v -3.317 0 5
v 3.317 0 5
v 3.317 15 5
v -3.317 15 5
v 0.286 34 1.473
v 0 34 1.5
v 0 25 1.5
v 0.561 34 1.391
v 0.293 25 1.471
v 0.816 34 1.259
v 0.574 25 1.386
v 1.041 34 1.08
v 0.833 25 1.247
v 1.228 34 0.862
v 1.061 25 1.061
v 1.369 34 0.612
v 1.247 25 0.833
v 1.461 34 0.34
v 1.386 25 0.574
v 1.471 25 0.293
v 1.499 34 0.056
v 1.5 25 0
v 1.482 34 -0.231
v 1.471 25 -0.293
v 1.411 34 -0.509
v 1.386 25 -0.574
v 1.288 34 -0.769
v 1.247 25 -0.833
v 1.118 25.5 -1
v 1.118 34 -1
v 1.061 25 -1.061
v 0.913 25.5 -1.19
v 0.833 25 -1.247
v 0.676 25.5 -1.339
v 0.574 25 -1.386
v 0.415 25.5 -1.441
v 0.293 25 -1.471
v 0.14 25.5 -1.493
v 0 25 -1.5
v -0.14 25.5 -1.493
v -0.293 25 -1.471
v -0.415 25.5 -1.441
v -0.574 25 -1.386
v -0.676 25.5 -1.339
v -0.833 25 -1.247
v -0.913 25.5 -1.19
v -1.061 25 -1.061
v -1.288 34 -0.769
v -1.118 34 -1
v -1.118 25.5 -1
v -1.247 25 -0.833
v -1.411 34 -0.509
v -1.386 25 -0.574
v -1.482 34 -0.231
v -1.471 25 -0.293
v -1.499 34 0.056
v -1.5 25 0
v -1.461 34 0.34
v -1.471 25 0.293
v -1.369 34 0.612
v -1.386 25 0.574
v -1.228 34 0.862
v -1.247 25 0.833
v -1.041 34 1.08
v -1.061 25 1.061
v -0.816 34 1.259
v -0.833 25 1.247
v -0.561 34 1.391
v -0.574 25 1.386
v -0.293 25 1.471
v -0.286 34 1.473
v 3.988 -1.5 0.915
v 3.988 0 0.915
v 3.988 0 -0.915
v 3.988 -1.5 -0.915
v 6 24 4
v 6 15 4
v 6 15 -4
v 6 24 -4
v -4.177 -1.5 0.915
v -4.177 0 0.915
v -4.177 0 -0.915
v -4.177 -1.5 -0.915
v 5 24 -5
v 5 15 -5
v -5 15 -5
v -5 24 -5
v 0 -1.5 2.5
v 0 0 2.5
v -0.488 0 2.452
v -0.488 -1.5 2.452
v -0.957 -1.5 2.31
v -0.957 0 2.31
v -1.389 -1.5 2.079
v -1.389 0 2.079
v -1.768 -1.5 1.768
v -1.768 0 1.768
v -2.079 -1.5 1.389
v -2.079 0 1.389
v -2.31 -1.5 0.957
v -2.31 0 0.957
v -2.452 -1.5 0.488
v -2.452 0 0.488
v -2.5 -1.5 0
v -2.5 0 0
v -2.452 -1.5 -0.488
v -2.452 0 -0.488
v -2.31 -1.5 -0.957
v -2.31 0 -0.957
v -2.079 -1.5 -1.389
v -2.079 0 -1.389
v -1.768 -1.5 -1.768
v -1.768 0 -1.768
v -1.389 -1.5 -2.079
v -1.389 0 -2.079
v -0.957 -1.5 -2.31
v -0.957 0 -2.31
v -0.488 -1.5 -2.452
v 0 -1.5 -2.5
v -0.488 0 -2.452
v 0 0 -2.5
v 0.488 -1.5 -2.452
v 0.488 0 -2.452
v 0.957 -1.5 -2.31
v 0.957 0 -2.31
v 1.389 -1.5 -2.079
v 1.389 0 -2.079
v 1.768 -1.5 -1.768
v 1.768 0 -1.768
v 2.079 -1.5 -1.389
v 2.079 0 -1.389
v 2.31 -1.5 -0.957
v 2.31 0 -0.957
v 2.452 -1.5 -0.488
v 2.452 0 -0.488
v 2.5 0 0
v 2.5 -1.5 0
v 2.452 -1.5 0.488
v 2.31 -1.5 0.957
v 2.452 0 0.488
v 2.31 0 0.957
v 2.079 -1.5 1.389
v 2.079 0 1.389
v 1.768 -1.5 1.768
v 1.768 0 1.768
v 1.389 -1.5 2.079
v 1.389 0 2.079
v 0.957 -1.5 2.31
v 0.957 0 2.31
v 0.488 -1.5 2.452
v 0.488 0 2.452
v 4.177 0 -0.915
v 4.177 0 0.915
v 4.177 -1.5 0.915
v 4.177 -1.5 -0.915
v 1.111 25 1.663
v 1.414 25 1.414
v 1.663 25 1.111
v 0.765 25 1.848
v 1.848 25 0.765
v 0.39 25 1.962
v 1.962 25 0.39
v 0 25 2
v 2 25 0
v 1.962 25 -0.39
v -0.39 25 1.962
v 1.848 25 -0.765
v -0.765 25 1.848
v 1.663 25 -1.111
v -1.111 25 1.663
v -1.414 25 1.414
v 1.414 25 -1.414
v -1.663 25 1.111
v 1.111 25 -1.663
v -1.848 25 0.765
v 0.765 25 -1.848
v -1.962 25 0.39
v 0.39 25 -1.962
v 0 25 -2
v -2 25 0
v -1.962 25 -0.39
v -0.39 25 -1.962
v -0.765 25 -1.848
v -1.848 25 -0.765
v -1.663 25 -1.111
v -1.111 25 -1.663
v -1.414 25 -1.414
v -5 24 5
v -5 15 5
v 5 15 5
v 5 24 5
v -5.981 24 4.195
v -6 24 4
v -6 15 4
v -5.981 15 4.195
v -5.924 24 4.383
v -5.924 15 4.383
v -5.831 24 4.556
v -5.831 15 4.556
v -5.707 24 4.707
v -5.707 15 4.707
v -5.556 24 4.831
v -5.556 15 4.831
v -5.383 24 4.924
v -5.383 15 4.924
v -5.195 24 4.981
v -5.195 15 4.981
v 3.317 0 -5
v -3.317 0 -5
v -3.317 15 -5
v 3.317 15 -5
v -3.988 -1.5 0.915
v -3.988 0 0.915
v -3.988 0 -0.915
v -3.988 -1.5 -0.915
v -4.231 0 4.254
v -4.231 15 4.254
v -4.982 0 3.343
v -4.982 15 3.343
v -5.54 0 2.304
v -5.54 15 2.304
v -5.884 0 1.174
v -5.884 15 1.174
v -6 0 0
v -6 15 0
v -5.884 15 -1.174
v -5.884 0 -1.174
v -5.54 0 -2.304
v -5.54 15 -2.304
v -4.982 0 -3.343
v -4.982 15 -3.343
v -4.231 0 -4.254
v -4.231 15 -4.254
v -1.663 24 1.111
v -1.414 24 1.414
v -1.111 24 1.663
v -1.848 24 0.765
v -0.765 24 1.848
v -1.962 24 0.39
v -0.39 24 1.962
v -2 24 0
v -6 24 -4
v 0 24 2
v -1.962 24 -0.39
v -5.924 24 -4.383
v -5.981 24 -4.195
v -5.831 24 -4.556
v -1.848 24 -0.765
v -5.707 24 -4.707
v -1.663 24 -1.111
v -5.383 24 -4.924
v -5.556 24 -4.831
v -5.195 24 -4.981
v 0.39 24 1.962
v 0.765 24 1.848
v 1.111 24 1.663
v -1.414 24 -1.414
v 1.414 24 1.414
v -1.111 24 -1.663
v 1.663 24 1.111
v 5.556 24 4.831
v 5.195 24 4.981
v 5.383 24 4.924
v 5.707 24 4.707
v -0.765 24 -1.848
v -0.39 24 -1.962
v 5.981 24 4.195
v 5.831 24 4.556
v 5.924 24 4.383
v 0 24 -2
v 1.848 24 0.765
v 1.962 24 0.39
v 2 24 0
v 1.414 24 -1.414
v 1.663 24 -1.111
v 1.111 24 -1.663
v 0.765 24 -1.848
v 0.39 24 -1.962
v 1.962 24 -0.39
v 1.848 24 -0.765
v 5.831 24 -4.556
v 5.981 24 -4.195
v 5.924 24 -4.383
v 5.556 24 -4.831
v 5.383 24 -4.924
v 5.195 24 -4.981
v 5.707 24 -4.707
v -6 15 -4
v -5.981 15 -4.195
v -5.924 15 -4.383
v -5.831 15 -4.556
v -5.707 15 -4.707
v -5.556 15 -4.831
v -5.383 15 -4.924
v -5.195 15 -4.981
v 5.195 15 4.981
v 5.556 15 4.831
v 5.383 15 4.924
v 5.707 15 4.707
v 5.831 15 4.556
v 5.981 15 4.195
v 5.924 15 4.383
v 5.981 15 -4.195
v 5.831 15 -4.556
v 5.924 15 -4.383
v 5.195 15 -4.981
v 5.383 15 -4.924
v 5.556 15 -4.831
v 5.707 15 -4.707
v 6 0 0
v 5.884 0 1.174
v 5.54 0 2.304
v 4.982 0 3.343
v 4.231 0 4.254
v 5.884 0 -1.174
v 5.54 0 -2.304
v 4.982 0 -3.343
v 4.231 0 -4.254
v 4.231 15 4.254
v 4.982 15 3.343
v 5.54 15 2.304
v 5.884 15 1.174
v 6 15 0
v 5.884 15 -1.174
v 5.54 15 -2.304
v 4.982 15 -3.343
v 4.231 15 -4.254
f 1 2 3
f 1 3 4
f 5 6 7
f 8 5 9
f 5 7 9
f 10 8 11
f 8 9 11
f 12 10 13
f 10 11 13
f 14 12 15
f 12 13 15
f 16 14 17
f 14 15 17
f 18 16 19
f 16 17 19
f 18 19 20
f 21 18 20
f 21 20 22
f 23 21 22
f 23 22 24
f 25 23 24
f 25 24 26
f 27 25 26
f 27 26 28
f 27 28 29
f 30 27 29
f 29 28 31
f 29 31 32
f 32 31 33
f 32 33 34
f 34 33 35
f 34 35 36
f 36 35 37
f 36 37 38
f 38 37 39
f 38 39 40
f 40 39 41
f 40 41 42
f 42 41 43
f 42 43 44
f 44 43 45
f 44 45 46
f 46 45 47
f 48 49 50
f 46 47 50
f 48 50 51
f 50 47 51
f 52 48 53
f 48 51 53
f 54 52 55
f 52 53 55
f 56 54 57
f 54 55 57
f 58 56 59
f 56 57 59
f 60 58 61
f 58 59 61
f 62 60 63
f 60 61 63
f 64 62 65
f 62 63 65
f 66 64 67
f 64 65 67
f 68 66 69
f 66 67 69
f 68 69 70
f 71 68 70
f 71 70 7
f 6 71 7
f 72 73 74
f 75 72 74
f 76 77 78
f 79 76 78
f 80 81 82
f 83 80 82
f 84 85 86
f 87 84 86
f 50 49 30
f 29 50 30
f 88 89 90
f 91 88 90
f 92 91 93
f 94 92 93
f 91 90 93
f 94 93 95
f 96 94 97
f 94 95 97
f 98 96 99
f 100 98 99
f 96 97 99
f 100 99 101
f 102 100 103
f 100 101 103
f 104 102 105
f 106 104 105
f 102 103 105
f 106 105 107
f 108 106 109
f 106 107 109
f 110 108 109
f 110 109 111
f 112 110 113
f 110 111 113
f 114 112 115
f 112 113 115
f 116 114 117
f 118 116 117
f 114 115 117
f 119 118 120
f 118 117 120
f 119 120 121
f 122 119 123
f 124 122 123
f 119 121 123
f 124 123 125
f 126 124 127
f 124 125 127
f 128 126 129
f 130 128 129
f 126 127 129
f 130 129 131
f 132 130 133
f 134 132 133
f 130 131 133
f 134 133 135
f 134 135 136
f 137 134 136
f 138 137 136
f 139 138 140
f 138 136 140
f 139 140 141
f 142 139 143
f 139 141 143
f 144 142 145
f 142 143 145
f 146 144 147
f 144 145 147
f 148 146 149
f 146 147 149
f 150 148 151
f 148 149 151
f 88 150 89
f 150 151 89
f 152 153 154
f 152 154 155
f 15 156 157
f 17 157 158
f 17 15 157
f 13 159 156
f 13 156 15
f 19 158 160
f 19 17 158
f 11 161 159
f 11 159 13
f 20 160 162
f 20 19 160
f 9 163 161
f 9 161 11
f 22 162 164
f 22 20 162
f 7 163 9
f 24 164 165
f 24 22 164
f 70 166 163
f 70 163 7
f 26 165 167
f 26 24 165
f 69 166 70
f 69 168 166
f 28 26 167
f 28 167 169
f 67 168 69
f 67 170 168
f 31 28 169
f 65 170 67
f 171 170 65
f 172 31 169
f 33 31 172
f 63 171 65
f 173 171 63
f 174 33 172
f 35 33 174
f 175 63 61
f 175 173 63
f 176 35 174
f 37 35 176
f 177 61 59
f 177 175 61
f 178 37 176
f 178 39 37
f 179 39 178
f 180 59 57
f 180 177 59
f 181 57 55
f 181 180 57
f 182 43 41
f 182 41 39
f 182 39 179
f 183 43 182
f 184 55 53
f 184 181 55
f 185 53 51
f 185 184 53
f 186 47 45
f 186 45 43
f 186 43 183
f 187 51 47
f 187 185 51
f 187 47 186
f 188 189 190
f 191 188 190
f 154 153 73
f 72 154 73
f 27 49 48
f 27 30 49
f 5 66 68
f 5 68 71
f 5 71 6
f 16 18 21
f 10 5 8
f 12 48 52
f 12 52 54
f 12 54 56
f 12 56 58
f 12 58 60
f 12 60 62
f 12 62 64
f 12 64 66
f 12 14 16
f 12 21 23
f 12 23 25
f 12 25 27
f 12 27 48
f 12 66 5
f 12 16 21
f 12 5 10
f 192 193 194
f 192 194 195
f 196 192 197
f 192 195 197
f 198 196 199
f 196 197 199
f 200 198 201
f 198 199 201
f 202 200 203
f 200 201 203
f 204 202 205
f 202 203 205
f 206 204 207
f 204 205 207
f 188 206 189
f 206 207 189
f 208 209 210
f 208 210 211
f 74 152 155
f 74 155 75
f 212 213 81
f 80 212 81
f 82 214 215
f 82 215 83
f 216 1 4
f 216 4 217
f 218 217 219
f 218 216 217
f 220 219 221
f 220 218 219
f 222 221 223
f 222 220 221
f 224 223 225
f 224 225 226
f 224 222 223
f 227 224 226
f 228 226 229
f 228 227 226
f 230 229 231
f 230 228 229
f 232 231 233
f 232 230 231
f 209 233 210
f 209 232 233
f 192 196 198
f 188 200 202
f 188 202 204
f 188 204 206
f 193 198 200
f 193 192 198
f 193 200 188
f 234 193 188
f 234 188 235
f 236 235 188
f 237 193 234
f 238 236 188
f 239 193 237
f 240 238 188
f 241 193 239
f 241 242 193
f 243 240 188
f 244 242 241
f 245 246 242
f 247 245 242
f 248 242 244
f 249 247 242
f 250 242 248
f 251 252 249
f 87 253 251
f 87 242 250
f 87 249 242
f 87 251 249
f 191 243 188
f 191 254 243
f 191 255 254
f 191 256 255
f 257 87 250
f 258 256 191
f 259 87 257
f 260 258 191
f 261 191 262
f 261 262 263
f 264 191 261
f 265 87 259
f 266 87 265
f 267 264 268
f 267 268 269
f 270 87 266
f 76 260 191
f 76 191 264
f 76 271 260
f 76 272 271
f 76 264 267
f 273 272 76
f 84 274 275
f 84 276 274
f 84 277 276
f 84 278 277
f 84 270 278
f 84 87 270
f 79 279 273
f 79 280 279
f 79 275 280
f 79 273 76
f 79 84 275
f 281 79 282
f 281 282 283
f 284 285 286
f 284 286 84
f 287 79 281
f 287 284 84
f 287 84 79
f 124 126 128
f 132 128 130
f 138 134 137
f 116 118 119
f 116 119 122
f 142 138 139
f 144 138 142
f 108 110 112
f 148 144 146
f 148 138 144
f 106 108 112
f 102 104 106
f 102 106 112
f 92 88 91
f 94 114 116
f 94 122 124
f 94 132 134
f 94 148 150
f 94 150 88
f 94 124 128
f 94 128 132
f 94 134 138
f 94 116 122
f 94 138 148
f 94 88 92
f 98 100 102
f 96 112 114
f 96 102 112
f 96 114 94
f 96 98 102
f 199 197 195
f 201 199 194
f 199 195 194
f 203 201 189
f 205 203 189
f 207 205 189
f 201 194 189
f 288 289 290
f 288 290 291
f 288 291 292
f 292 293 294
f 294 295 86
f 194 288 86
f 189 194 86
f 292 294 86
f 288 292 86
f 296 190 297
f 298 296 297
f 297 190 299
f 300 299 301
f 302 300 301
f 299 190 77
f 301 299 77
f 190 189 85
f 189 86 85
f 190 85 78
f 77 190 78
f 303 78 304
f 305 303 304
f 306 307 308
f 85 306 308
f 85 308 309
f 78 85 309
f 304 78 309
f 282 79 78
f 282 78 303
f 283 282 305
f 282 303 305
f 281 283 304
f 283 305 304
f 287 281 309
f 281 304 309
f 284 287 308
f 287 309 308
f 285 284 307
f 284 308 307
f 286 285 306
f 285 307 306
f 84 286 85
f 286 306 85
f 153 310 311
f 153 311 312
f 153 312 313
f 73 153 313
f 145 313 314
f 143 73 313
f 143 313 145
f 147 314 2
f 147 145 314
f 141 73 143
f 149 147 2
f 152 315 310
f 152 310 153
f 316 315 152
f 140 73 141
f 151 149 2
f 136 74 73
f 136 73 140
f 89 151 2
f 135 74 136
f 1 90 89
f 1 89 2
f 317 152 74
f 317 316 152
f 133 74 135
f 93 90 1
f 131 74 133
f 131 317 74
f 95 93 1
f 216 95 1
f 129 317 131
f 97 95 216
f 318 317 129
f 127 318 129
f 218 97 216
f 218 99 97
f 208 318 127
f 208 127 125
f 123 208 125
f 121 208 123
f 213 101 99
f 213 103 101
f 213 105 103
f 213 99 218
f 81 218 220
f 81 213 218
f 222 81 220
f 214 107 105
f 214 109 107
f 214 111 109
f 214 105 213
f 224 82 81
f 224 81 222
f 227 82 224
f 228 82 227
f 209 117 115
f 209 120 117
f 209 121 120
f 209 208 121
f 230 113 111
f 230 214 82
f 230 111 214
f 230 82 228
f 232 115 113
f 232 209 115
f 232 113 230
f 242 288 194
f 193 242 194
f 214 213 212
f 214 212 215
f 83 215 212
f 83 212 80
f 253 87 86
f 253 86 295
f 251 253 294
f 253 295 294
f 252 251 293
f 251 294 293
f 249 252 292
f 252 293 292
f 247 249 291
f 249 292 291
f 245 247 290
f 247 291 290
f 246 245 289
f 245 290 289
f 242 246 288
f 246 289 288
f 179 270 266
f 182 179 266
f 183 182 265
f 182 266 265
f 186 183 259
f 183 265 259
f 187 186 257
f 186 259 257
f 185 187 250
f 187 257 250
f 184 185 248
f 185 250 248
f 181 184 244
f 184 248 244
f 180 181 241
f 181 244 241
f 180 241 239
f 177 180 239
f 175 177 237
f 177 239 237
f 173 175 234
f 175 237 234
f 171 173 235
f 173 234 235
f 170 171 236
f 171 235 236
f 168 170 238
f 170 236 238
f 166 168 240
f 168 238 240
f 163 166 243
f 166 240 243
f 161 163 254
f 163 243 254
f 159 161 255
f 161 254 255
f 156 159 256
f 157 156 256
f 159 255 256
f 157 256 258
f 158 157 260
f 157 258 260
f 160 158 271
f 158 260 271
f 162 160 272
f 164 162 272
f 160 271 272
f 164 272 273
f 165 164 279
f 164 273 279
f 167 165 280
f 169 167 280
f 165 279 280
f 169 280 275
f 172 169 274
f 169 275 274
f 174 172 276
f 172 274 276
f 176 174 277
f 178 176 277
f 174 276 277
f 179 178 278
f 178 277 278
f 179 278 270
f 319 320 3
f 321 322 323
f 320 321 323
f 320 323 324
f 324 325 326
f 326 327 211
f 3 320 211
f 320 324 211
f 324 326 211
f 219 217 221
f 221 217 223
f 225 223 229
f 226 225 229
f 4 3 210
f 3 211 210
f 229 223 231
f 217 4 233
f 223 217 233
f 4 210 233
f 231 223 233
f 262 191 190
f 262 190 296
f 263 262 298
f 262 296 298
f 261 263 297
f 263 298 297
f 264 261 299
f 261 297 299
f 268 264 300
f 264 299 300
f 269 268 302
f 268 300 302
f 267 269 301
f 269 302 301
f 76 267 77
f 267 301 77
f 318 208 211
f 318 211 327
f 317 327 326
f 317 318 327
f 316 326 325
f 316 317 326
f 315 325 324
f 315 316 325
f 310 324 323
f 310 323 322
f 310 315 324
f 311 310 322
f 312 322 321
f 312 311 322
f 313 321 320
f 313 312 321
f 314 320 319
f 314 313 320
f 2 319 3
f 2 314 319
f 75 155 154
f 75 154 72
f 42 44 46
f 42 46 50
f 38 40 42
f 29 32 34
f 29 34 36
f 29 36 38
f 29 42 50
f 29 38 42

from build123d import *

# Parameters (mm, degrees)
BOSS_EXTRUDE1_DEPTH = 15
SKETCH2_R           = 2.5
SKETCH2_W           = 0.189248461
SKETCH2_H           = 1.830812042
BOSS_EXTRUDE2_DEPTH = 1.5
BOSS_EXTRUDE3_DEPTH = 9
SKETCH4_R           = 2
BOSS_EXTRUDE4_DEPTH = 1
SKETCH5_R           = 1.5
BOSS_EXTRUDE5_DEPTH = 10
CUT_EXTRUDE1_DEPTH  = 8.5


with BuildPart() as part:
    # Sketch1 → Boss-Extrude1 (new body)
    with BuildSketch(Plane(origin=(0, 0, 0), x_dir=(1, 0, 0), z_dir=(0, 1, 0))):
        with BuildLine():
            Line((-3.31662479, 5), (3.31662479, 5))
            ThreePointArc((3.31662479, 5), (6, 0), (3.31662479, -5))
            Line((3.31662479, -5), (-3.31662479, -5))
            ThreePointArc((-3.31662479, -5), (-6, 0), (-3.31662479, 5))
        make_face()
    extrude(amount=BOSS_EXTRUDE1_DEPTH)

    # Sketch2 → Boss-Extrude2 (add)
    with BuildSketch(Plane(origin=(0, 0, 0), x_dir=(-1, 0, 0), z_dir=(0, -1, 0))):
        with Locations(Location((0, 0, 0), (0, 0, 270))):
            Circle(SKETCH2_R)
        with Locations((4.082359667, 0)):
            Rectangle(SKETCH2_W, SKETCH2_H)
        with Locations((-4.082359667, 0)):
            Rectangle(SKETCH2_W, SKETCH2_H)
    extrude(amount=BOSS_EXTRUDE2_DEPTH)


with BuildPart() as body_2:
    # Sketch3 → Boss-Extrude3 (new body)
    with BuildSketch(Plane(origin=(0, 15, 0), x_dir=(1, 0, 0), z_dir=(0, 1, 0))):
        with BuildLine():
            Line((5, 5), (-5, 5))
            ThreePointArc((-5, 5), (-5.707106781, 4.707106781), (-6, 4))
            Line((-6, 4), (-6, -4))
            ThreePointArc((-6, -4), (-5.707106781, -4.707106781), (-5, -5))
            Line((-5, -5), (5, -5))
            ThreePointArc((5, -5), (5.707106781, -4.707106781), (6, -4))
            Line((6, -4), (6, 4))
            ThreePointArc((6, 4), (5.707106781, 4.707106781), (5, 5))
        make_face()
    extrude(amount=BOSS_EXTRUDE3_DEPTH)

    # Sketch4 → Boss-Extrude4 (add)
    with BuildSketch(Plane(origin=(0, 24, 0), x_dir=(1, 0, 0), z_dir=(0, 1, 0))):
        with Locations(Location((0, 0, 0), (0, 0, 90))):
            Circle(SKETCH4_R)
    extrude(amount=BOSS_EXTRUDE4_DEPTH)

    # Sketch5 → Boss-Extrude5 (add)
    with BuildSketch(Plane(origin=(0, 24, 0), x_dir=(1, 0, 0), z_dir=(0, 1, 0))):
        with Locations(Location((0, 0, 0), (0, 0, 270))):
            Circle(SKETCH5_R)
    extrude(amount=BOSS_EXTRUDE5_DEPTH)

    # Sketch6 → Cut-Extrude1 (cut)
    with BuildSketch(Plane(origin=(0, 34, 0), x_dir=(1, 0, 0), z_dir=(0, 1, 0))):
        with BuildLine():
            Line((-1.118033989, 1), (1.118033989, 1))
            ThreePointArc((1.118033989, 1), (0, 1.5), (-1.118033989, 1))
        make_face()
    extrude(amount=-CUT_EXTRUDE1_DEPTH, mode=Mode.SUBTRACT)


solid = Compound([part.part, body_2.part])
